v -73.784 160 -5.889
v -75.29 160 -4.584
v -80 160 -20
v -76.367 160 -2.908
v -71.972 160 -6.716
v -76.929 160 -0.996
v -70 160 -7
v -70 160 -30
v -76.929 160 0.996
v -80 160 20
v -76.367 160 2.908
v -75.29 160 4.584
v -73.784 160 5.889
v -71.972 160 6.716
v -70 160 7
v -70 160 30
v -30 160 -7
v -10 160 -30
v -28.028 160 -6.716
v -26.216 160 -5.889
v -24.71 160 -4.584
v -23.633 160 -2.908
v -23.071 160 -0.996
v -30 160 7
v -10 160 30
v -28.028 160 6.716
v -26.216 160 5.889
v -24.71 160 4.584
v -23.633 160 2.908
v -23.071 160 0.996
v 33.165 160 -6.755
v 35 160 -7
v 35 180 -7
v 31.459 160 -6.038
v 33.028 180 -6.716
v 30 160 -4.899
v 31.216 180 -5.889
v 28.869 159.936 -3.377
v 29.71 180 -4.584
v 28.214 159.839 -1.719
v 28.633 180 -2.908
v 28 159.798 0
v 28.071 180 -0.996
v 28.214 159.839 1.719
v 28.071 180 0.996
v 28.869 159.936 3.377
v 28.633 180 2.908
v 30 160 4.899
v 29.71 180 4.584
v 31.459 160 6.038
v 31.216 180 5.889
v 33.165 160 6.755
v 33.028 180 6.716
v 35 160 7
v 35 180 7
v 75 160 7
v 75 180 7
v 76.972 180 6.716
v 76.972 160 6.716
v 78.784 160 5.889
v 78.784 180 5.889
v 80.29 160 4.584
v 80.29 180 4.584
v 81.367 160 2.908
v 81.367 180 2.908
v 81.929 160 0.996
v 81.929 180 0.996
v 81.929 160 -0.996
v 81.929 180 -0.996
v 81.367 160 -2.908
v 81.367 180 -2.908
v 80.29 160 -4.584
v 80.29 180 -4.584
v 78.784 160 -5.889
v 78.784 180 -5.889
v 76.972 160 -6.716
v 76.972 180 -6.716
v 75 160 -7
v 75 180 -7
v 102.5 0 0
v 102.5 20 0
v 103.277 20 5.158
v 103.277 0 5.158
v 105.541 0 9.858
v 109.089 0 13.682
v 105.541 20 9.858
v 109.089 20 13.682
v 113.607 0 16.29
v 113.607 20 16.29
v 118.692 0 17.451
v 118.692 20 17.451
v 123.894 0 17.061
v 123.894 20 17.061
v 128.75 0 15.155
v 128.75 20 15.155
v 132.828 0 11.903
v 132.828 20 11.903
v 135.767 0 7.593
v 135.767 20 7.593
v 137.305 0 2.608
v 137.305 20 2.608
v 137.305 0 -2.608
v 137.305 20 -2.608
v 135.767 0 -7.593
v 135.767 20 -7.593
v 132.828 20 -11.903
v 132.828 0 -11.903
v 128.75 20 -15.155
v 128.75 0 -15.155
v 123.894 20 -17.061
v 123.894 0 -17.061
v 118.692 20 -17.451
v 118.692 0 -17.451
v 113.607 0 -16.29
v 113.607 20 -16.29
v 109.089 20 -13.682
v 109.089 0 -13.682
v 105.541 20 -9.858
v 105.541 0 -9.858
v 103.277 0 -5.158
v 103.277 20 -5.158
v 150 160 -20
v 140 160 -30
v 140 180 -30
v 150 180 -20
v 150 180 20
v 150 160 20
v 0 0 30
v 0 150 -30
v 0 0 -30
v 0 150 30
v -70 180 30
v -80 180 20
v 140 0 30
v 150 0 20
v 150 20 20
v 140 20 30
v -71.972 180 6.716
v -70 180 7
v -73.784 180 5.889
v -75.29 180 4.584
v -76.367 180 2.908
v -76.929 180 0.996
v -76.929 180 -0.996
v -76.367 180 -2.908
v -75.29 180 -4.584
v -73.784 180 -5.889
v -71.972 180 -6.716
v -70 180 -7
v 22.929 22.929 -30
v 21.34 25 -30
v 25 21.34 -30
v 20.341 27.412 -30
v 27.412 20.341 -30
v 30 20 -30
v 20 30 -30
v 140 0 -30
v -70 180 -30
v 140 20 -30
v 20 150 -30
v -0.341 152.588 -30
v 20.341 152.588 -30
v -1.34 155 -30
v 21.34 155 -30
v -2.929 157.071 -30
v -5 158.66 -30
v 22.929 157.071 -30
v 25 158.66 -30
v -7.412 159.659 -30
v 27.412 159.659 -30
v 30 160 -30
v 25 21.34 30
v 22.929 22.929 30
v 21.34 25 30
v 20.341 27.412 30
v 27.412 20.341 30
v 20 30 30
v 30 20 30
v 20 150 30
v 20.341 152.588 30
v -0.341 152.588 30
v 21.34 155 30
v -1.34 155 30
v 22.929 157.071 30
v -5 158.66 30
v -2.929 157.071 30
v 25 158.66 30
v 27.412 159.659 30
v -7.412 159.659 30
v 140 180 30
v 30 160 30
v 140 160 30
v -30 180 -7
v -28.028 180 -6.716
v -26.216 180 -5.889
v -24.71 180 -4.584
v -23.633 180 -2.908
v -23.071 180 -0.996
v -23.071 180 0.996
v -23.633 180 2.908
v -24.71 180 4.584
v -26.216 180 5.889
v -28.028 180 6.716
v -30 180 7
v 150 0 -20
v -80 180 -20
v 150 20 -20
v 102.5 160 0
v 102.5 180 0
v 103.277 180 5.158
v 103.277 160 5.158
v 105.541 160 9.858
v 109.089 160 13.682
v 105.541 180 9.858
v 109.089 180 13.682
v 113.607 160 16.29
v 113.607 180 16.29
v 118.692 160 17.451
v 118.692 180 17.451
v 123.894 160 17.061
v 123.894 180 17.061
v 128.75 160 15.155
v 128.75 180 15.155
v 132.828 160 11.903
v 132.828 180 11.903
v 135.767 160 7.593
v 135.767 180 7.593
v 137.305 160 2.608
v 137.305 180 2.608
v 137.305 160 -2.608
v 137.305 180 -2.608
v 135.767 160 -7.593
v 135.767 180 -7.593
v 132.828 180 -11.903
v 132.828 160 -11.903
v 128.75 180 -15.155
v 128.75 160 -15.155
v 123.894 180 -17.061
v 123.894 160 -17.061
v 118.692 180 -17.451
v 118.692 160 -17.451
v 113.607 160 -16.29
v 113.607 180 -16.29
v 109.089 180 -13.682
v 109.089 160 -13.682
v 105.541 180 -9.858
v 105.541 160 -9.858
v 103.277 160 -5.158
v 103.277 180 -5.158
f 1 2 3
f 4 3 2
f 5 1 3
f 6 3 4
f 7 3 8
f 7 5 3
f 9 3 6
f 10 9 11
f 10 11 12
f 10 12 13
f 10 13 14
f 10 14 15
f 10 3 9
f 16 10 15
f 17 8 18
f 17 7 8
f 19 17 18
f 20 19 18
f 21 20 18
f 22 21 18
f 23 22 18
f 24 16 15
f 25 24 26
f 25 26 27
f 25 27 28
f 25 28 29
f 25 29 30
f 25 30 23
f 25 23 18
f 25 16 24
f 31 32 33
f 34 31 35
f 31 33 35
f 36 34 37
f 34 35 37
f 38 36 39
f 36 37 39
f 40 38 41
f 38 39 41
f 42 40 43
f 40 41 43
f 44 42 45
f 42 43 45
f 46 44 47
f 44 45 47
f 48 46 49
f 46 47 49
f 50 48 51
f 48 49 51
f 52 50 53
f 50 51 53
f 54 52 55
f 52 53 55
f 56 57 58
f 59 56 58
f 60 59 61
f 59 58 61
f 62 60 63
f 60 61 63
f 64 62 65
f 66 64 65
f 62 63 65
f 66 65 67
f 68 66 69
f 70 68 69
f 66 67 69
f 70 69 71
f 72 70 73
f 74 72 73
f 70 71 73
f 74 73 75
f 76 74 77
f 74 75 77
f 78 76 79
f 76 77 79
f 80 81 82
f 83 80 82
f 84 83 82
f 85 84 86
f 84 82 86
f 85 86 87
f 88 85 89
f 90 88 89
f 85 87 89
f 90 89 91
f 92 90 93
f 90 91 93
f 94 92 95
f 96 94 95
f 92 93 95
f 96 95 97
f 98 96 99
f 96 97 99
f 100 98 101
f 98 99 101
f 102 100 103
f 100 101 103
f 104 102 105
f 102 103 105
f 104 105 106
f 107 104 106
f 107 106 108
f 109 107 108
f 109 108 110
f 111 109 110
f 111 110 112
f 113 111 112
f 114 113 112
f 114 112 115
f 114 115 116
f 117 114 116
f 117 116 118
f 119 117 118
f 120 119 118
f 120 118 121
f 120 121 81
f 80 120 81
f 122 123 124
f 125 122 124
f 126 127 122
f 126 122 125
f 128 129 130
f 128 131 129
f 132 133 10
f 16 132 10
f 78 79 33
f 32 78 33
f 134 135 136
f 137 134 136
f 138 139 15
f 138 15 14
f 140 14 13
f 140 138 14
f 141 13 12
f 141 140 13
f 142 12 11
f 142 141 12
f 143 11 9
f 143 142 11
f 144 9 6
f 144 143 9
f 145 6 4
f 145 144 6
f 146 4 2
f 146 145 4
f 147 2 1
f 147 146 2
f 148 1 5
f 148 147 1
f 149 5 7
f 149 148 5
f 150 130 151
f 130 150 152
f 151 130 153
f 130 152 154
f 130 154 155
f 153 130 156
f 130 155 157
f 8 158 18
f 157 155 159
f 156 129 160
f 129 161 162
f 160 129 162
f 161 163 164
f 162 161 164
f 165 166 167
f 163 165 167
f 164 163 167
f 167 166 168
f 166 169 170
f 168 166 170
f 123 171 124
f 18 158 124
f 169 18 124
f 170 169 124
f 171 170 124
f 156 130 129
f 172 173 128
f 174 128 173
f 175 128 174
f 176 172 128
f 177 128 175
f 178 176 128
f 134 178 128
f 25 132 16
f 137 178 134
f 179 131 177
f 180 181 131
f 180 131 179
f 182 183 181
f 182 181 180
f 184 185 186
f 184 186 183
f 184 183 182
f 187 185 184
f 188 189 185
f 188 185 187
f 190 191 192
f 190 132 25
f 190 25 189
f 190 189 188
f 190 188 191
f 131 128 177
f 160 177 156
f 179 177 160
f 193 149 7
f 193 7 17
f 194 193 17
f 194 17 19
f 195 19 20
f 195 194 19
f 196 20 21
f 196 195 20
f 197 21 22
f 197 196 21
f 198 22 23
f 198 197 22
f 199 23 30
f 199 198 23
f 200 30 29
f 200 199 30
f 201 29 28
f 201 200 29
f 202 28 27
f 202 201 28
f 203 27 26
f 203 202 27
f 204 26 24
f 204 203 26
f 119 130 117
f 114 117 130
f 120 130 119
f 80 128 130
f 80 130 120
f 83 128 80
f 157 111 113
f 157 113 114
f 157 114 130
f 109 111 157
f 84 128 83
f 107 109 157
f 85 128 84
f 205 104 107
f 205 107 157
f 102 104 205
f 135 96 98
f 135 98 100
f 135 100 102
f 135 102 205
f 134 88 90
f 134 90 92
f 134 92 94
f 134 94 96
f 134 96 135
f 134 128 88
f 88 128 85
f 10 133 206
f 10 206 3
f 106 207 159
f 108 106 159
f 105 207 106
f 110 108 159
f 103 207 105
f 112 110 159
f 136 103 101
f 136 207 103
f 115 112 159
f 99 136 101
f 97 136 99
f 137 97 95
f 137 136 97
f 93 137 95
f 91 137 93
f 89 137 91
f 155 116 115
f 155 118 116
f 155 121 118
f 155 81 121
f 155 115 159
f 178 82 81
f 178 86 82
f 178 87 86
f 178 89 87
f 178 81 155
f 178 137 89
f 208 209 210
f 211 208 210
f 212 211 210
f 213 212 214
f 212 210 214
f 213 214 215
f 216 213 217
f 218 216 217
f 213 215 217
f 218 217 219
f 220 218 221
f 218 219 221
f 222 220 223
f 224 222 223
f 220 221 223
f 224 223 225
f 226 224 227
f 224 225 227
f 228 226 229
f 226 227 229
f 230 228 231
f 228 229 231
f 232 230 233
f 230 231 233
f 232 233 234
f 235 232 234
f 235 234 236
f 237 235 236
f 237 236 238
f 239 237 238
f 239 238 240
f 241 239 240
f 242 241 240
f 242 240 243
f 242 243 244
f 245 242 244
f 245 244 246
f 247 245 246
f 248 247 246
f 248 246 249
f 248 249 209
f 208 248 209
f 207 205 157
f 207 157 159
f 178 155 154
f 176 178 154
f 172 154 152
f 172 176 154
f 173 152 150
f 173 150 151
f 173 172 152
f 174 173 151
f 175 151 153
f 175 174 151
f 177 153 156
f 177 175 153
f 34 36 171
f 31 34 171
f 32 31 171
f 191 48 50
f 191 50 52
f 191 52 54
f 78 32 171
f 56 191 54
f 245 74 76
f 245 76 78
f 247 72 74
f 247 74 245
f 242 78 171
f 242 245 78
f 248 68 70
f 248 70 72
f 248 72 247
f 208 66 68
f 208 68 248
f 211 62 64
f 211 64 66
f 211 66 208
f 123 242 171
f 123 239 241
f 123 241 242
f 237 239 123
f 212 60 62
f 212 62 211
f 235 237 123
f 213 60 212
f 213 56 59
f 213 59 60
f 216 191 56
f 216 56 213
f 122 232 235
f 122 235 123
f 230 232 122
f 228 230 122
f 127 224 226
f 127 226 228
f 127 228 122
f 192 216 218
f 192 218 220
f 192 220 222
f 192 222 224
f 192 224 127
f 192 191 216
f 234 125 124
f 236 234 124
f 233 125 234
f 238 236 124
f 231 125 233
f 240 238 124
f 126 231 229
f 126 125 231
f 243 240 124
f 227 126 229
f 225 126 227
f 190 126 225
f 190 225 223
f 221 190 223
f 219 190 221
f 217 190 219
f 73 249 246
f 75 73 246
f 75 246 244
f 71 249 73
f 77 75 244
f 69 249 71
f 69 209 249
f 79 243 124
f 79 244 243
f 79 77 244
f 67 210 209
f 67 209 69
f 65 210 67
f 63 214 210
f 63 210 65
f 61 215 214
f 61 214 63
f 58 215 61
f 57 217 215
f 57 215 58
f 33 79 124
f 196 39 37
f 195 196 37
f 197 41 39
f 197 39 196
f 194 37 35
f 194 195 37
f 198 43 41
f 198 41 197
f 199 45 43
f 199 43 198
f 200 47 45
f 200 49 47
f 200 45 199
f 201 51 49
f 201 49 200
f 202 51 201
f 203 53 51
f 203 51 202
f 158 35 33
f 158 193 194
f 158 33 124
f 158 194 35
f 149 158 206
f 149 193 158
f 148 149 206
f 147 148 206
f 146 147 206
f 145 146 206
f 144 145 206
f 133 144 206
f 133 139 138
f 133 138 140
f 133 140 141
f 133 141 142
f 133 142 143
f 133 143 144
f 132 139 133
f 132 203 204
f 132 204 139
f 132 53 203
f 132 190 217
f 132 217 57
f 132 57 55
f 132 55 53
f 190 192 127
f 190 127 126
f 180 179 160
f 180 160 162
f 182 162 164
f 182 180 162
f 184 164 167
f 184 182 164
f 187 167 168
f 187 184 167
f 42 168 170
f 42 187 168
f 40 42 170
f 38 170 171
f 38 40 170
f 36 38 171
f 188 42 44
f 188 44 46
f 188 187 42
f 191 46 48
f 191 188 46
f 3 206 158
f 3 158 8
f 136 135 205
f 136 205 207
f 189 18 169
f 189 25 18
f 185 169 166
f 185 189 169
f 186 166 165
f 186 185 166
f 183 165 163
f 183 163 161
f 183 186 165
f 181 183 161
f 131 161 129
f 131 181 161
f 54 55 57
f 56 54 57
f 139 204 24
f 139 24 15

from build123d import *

# Parameters (mm, degrees)
BOSS_EXTRUDE1_DEPTH = 30
CHAMFER1_SIZE       = 10
CHAMFER2_SIZE       = 10
SKETCH2_R           = 17.5
CUT_EXTRUDE1_DEPTH  = 212
CUT_EXTRUDE2_DEPTH  = 111


with BuildPart() as part:
    # Sketch1 → Boss-Extrude1 (new, symmetric)
    with BuildSketch(Plane.XY):
        with BuildLine():
            Line((0, 150), (0, 0))
            Line((0, 0), (150, 0))
            Line((150, 0), (150, 20))
            Line((150, 20), (30, 20))
            ThreePointArc((30, 20), (22.928932188, 22.928932188), (20, 30))
            Line((20, 30), (20, 150))
            ThreePointArc((20, 150), (22.928932188, 157.071067812), (30, 160))
            Line((30, 160), (150, 160))
            Line((150, 160), (150, 180))
            Line((150, 180), (-80, 180))
            Line((-80, 180), (-80, 160))
            Line((-80, 160), (-10, 160))
            ThreePointArc((-10, 160), (-2.928932188, 157.071067812), (0, 150))
        make_face()
    extrude(amount=BOSS_EXTRUDE1_DEPTH, both=True)

    # Chamfer1
    chamfer1_edges = [part.edges().sort_by_distance(p)[0] for p in [
        (150, 170, 30),
    ]]
    chamfer(chamfer1_edges, length=CHAMFER1_SIZE)

    # Chamfer2
    chamfer2_edges = [part.edges().sort_by_distance(p)[0] for p in [
        (-80, 170, 30),
        (150, 10, -30),
        (150, 170, -30),
        (-80, 170, -30),
        (150, 10, 30),
    ]]
    chamfer(chamfer2_edges, length=CHAMFER2_SIZE)

    # Sketch2 → Cut-Extrude1 (cut)
    with BuildSketch(Plane(origin=(0, 180, 0), x_dir=(1, 0, 0), z_dir=(0, 1, 0))):
        with BuildLine():
            ThreePointArc((-30, 7), (-23, 0), (-30, -7))
            Line((-30, -7), (-70, -7))
            ThreePointArc((-70, -7), (-77, 0), (-70, 7))
            Line((-70, 7), (-30, 7))
        make_face()
        with Locations(Location((120, 0, 0), (0, 0, 180))):
            Circle(SKETCH2_R)
    extrude(amount=-CUT_EXTRUDE1_DEPTH, mode=Mode.SUBTRACT)

    # Sketch4 → Cut-Extrude2 (cut)
    with BuildSketch(Plane(origin=(0, 180, 0), x_dir=(1, 0, 0), z_dir=(0, 1, 0))):
        with BuildLine():
            Line((75, 7), (35, 7))
            ThreePointArc((35, 7), (28, 0), (35, -7))
            Line((35, -7), (75, -7))
            ThreePointArc((75, -7), (82, 0), (75, 7))
        make_face()
    extrude(amount=-CUT_EXTRUDE2_DEPTH, mode=Mode.SUBTRACT)


solid = part.part
